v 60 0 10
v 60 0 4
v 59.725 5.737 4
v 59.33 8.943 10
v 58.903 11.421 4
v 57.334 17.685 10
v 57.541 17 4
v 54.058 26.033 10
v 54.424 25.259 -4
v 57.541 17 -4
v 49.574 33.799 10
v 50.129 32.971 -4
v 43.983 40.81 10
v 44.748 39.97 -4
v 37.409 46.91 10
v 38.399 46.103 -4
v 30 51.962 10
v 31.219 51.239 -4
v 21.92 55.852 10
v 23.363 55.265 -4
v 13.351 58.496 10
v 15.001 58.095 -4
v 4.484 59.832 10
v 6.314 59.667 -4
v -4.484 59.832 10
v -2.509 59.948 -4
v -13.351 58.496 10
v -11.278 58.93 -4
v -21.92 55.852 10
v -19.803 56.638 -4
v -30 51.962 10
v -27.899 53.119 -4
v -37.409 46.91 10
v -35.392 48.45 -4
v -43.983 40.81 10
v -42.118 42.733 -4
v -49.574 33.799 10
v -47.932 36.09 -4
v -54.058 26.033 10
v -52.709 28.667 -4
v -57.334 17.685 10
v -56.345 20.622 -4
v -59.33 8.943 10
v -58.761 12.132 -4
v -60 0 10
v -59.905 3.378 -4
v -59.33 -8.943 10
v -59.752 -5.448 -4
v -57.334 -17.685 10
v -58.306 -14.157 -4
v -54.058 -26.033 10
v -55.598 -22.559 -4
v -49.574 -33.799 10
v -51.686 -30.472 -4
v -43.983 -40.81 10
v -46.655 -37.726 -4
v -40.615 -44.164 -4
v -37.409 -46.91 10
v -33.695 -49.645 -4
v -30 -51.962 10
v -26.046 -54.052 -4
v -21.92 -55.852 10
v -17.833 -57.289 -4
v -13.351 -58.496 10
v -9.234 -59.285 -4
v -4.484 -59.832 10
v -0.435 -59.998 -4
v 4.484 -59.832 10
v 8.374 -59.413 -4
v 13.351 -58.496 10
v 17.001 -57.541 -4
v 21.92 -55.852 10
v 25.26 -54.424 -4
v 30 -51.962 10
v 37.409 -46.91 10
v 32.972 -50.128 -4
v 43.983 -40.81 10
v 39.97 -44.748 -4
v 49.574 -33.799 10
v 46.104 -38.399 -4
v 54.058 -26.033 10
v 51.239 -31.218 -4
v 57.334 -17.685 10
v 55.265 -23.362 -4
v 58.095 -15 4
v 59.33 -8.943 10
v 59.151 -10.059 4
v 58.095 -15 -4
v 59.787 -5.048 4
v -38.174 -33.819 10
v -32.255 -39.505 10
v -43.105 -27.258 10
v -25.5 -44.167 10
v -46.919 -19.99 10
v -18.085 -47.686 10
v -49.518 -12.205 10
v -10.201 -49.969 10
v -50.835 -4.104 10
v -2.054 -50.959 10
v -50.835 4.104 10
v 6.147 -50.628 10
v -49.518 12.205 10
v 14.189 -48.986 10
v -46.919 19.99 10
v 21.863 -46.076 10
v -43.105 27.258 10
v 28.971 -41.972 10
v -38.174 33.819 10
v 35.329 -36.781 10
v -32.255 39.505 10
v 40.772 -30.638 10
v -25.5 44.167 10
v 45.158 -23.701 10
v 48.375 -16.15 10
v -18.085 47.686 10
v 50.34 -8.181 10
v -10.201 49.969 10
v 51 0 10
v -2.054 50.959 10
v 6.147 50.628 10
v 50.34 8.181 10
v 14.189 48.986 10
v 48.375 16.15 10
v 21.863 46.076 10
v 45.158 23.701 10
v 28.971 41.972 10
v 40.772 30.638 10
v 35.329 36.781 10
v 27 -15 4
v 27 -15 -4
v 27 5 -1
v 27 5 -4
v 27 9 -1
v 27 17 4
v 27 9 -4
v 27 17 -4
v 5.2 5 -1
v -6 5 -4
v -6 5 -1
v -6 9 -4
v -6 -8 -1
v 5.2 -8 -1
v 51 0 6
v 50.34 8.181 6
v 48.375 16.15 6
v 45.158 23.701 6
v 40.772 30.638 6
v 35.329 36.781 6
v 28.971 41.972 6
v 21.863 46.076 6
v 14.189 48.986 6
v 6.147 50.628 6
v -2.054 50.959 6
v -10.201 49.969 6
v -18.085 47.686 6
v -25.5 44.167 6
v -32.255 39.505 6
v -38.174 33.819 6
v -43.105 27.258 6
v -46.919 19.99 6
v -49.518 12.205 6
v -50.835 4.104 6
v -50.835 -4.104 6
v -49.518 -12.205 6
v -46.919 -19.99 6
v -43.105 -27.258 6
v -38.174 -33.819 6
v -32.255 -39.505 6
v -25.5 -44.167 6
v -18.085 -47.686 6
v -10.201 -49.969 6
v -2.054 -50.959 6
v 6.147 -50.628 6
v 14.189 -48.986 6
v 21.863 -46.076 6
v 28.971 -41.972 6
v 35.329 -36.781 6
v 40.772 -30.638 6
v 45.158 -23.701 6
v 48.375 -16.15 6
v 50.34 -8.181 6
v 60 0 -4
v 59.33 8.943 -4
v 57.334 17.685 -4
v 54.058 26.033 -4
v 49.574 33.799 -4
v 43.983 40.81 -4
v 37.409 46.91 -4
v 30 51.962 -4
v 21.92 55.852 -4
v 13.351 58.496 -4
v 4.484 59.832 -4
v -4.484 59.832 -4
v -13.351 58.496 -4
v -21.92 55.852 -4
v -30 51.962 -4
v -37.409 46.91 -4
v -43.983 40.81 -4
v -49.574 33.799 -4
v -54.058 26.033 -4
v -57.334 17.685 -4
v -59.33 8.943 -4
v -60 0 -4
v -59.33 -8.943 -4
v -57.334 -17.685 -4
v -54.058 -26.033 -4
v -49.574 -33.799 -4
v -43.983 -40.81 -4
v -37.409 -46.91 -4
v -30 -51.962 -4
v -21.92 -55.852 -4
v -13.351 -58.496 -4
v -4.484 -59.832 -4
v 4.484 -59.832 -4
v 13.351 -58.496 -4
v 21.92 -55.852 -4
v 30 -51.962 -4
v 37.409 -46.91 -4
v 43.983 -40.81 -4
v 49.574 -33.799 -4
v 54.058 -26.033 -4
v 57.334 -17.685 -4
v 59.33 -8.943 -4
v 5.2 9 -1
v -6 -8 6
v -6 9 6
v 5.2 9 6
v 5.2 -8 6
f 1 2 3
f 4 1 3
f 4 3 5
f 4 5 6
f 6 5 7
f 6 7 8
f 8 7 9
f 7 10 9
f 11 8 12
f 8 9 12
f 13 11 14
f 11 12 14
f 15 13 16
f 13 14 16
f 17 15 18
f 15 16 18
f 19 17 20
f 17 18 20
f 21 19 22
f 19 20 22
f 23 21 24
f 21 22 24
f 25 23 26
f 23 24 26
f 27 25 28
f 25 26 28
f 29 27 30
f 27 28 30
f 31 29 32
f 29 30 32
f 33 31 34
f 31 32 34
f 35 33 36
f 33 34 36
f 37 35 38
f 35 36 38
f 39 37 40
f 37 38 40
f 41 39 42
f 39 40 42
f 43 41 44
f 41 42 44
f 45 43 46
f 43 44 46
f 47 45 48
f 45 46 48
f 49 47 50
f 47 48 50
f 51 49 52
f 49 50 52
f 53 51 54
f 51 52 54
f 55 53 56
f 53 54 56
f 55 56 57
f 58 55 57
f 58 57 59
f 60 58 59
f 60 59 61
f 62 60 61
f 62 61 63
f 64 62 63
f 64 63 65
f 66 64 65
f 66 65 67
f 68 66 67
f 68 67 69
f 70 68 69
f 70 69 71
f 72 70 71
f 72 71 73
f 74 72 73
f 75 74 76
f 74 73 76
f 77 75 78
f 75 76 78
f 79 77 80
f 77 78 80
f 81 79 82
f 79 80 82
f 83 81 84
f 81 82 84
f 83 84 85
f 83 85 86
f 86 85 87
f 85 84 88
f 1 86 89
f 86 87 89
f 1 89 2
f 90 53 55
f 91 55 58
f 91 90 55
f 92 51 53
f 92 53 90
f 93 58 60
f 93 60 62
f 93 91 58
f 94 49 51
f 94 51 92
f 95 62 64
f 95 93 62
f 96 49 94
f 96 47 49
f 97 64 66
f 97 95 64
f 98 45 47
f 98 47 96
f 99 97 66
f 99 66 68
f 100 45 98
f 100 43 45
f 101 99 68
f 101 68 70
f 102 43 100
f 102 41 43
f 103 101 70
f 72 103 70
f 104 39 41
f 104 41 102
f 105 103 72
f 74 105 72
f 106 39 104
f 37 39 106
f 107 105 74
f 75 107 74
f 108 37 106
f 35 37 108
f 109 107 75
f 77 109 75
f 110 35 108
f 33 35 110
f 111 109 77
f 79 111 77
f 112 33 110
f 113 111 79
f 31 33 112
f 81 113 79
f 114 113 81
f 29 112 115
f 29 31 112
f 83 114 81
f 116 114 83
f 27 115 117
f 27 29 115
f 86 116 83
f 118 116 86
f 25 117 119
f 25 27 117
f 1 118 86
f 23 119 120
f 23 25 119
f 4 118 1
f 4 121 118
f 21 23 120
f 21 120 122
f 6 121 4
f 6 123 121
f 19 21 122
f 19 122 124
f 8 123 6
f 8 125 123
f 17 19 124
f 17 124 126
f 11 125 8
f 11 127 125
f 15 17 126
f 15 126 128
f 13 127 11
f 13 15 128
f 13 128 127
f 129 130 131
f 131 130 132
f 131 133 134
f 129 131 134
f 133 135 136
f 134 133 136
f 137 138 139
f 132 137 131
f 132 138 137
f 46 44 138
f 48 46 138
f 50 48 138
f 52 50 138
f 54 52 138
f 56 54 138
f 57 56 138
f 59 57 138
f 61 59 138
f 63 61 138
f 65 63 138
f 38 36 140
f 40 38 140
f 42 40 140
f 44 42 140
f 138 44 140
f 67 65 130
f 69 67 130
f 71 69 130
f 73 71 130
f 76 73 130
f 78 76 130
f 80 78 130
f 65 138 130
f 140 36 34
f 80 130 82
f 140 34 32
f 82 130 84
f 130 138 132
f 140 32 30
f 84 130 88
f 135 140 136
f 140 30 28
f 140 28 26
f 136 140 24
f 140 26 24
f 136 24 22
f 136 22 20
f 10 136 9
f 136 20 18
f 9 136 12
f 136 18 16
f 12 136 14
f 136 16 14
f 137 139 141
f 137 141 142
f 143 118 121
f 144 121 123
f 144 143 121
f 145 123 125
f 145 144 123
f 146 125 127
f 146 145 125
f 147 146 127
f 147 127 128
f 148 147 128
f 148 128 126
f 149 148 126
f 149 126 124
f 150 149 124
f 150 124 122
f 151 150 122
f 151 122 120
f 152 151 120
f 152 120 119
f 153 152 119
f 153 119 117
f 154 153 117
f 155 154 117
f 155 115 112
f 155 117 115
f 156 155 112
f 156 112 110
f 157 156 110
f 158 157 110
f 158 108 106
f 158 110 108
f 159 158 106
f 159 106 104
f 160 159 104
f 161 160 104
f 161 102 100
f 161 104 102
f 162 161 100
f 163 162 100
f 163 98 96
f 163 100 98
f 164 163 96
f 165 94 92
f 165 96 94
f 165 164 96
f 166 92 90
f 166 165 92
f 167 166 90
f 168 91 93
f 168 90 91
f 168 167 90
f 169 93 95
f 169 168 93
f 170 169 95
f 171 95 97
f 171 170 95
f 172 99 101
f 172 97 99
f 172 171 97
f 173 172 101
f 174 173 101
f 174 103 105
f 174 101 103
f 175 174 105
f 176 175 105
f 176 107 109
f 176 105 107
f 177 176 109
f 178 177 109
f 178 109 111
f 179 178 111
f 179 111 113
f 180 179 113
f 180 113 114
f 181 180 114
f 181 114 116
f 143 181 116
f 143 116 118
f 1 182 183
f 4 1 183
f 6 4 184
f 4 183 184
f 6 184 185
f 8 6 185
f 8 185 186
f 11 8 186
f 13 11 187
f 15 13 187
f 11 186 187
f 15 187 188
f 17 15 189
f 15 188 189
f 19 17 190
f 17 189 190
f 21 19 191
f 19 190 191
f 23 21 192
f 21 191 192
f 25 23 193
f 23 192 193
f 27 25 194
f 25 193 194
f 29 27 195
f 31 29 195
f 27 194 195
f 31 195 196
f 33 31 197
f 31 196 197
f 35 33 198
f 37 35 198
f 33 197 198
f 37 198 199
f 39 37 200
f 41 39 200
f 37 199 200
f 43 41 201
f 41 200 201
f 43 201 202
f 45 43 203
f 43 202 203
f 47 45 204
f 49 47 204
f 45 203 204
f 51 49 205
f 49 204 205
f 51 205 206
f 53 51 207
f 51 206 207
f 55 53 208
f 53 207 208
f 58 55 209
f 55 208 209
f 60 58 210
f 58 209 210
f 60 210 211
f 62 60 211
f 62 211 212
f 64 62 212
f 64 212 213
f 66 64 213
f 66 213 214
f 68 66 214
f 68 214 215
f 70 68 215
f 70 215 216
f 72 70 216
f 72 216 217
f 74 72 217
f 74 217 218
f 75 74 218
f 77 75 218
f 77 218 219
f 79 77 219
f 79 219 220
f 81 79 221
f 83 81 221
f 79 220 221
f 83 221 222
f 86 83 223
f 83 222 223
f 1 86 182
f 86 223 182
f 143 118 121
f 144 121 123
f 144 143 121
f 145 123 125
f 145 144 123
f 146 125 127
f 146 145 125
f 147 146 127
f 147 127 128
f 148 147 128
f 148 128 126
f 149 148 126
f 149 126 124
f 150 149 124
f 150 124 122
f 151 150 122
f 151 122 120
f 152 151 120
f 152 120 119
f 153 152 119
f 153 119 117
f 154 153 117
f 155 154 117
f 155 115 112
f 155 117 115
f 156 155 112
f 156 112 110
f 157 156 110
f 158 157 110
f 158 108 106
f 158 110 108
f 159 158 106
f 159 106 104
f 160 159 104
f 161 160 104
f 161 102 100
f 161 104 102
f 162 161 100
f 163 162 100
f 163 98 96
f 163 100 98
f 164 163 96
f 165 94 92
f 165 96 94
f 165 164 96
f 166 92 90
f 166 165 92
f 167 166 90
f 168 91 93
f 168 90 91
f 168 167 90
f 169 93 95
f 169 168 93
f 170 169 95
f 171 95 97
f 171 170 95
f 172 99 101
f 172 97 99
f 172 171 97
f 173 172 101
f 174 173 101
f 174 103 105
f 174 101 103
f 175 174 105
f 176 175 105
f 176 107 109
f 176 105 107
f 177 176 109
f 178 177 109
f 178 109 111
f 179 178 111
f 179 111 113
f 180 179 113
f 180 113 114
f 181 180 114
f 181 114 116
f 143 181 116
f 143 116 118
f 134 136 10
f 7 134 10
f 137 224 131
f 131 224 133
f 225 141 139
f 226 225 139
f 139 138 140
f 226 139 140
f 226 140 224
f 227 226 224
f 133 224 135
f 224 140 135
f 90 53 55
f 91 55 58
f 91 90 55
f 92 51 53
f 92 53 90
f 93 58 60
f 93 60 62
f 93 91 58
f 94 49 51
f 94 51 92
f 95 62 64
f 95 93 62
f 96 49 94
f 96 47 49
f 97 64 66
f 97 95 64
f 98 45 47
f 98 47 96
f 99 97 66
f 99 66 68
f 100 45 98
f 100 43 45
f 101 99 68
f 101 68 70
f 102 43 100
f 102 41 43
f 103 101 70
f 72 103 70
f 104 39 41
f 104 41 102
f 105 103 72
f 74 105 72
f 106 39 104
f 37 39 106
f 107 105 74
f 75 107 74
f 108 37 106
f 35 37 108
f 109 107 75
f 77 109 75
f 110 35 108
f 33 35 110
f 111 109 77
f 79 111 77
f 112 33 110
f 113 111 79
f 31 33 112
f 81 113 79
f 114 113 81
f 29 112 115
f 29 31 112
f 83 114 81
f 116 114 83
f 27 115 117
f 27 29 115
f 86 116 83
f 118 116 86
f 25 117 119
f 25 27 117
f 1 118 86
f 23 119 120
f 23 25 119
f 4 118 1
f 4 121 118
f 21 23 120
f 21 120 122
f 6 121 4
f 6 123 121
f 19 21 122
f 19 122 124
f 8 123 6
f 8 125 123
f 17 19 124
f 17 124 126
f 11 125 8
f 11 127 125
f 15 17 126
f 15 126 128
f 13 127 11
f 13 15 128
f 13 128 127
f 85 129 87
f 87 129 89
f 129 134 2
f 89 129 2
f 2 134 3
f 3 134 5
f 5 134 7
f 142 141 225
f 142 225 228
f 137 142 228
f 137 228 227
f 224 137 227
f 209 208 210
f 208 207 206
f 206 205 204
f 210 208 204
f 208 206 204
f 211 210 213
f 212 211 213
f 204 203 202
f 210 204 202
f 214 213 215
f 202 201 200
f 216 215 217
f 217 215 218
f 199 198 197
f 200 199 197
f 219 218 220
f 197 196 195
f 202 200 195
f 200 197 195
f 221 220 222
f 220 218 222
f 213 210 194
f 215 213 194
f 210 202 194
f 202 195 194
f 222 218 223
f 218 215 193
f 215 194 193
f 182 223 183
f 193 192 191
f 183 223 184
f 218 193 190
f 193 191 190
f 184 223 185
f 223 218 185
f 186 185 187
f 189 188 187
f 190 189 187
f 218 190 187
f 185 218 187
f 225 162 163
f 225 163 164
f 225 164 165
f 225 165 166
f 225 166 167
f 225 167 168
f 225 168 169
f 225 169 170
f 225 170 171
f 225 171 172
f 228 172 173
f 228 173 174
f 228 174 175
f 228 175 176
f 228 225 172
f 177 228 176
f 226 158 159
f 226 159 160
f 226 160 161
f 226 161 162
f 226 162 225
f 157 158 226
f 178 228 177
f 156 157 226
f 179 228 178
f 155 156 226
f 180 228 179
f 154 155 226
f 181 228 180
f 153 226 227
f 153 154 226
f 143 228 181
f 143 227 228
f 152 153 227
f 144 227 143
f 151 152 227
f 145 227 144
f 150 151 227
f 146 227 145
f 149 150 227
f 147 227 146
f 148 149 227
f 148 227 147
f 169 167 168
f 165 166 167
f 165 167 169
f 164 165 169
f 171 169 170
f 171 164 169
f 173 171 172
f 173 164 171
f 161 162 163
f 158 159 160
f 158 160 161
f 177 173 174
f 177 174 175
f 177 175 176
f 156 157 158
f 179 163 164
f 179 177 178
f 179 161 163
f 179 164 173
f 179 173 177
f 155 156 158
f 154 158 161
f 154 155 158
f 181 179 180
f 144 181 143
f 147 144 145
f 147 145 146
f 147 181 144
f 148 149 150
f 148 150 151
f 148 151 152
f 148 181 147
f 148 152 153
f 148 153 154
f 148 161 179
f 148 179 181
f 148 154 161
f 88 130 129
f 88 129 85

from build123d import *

# Parameters (mm, degrees)
BOX003_W          = 29
BOX003_H          = 4
BOX003_DEPTH      = 4
BOX002_W          = 34
BOX002_H          = 32
BOX002_DEPTH      = 9
BOX001_W          = 11.2
BOX001_H          = 4
BOX001_DEPTH      = 27
BOX_W             = 11.2
BOX_H             = 17
BOX_DEPTH         = 8
CYLINDER_R        = 51
CYLINDER_DEPTH    = 5
CYLINDER001_R     = 60
CYLINDER001_DEPTH = 14


with BuildPart() as cube003:
    # Box003 → Box003 (new body)
    with BuildSketch(Plane(origin=(0, 5, -5), x_dir=(1, 0, 0), z_dir=(0, 0, 1))):
        with Locations((14.5, 2)):
            Rectangle(BOX003_W, BOX003_H)
    extrude(amount=BOX003_DEPTH)


with BuildPart() as cube002:
    # Box002 → Box002 (new body)
    with BuildSketch(Plane(origin=(27, -15, -5), x_dir=(1, 0, 0), z_dir=(0, 0, 1))):
        with Locations((17, 16)):
            Rectangle(BOX002_W, BOX002_H)
    extrude(amount=BOX002_DEPTH)


with BuildPart() as cube001:
    # Box001 → Box001 (new body)
    with BuildSketch(Plane(origin=(-6, 5, -18), x_dir=(1, 0, 0), z_dir=(0, 0, 1))):
        with Locations((5.6, 2)):
            Rectangle(BOX001_W, BOX001_H)
    extrude(amount=BOX001_DEPTH)


with BuildPart() as cube:
    # Box → Box (new body)
    with BuildSketch(Plane(origin=(-6, -8, -1), x_dir=(1, 0, 0), z_dir=(0, 0, 1))):
        with Locations((5.6, 8.5)):
            Rectangle(BOX_W, BOX_H)
    extrude(amount=BOX_DEPTH)


with BuildPart() as cylinder:
    # Cylinder → Cylinder (new body)
    with BuildSketch(Plane.XY.offset(6)):
        Circle(CYLINDER_R)
    extrude(amount=CYLINDER_DEPTH)


with BuildPart() as cylinder001:
    # Cylinder001 → Cylinder001 (new body)
    with BuildSketch(Plane.XY.offset(-4)):
        Circle(CYLINDER001_R)
    extrude(amount=CYLINDER001_DEPTH)


with BuildPart() as cut005:
    # Cut001 base: copy of Cylinder001
    add(cylinder001.part)

    # Cut001: cut Cylinder
    add(cylinder.part, mode=Mode.SUBTRACT)

    # Cut002: cut Cube
    add(cube.part, mode=Mode.SUBTRACT)

    # Cut003: cut Cube001
    add(cube001.part, mode=Mode.SUBTRACT)

    # Cut004: cut Cube002
    add(cube002.part, mode=Mode.SUBTRACT)

    # Cut005: cut Cube003
    add(cube003.part, mode=Mode.SUBTRACT)


with BuildPart() as cut:
    # Cut base: copy of Cylinder001
    add(cylinder001.part)

    # Cut: cut Cylinder
    add(cylinder.part, mode=Mode.SUBTRACT)


solid = Compound([cut005.part, cut.part])
